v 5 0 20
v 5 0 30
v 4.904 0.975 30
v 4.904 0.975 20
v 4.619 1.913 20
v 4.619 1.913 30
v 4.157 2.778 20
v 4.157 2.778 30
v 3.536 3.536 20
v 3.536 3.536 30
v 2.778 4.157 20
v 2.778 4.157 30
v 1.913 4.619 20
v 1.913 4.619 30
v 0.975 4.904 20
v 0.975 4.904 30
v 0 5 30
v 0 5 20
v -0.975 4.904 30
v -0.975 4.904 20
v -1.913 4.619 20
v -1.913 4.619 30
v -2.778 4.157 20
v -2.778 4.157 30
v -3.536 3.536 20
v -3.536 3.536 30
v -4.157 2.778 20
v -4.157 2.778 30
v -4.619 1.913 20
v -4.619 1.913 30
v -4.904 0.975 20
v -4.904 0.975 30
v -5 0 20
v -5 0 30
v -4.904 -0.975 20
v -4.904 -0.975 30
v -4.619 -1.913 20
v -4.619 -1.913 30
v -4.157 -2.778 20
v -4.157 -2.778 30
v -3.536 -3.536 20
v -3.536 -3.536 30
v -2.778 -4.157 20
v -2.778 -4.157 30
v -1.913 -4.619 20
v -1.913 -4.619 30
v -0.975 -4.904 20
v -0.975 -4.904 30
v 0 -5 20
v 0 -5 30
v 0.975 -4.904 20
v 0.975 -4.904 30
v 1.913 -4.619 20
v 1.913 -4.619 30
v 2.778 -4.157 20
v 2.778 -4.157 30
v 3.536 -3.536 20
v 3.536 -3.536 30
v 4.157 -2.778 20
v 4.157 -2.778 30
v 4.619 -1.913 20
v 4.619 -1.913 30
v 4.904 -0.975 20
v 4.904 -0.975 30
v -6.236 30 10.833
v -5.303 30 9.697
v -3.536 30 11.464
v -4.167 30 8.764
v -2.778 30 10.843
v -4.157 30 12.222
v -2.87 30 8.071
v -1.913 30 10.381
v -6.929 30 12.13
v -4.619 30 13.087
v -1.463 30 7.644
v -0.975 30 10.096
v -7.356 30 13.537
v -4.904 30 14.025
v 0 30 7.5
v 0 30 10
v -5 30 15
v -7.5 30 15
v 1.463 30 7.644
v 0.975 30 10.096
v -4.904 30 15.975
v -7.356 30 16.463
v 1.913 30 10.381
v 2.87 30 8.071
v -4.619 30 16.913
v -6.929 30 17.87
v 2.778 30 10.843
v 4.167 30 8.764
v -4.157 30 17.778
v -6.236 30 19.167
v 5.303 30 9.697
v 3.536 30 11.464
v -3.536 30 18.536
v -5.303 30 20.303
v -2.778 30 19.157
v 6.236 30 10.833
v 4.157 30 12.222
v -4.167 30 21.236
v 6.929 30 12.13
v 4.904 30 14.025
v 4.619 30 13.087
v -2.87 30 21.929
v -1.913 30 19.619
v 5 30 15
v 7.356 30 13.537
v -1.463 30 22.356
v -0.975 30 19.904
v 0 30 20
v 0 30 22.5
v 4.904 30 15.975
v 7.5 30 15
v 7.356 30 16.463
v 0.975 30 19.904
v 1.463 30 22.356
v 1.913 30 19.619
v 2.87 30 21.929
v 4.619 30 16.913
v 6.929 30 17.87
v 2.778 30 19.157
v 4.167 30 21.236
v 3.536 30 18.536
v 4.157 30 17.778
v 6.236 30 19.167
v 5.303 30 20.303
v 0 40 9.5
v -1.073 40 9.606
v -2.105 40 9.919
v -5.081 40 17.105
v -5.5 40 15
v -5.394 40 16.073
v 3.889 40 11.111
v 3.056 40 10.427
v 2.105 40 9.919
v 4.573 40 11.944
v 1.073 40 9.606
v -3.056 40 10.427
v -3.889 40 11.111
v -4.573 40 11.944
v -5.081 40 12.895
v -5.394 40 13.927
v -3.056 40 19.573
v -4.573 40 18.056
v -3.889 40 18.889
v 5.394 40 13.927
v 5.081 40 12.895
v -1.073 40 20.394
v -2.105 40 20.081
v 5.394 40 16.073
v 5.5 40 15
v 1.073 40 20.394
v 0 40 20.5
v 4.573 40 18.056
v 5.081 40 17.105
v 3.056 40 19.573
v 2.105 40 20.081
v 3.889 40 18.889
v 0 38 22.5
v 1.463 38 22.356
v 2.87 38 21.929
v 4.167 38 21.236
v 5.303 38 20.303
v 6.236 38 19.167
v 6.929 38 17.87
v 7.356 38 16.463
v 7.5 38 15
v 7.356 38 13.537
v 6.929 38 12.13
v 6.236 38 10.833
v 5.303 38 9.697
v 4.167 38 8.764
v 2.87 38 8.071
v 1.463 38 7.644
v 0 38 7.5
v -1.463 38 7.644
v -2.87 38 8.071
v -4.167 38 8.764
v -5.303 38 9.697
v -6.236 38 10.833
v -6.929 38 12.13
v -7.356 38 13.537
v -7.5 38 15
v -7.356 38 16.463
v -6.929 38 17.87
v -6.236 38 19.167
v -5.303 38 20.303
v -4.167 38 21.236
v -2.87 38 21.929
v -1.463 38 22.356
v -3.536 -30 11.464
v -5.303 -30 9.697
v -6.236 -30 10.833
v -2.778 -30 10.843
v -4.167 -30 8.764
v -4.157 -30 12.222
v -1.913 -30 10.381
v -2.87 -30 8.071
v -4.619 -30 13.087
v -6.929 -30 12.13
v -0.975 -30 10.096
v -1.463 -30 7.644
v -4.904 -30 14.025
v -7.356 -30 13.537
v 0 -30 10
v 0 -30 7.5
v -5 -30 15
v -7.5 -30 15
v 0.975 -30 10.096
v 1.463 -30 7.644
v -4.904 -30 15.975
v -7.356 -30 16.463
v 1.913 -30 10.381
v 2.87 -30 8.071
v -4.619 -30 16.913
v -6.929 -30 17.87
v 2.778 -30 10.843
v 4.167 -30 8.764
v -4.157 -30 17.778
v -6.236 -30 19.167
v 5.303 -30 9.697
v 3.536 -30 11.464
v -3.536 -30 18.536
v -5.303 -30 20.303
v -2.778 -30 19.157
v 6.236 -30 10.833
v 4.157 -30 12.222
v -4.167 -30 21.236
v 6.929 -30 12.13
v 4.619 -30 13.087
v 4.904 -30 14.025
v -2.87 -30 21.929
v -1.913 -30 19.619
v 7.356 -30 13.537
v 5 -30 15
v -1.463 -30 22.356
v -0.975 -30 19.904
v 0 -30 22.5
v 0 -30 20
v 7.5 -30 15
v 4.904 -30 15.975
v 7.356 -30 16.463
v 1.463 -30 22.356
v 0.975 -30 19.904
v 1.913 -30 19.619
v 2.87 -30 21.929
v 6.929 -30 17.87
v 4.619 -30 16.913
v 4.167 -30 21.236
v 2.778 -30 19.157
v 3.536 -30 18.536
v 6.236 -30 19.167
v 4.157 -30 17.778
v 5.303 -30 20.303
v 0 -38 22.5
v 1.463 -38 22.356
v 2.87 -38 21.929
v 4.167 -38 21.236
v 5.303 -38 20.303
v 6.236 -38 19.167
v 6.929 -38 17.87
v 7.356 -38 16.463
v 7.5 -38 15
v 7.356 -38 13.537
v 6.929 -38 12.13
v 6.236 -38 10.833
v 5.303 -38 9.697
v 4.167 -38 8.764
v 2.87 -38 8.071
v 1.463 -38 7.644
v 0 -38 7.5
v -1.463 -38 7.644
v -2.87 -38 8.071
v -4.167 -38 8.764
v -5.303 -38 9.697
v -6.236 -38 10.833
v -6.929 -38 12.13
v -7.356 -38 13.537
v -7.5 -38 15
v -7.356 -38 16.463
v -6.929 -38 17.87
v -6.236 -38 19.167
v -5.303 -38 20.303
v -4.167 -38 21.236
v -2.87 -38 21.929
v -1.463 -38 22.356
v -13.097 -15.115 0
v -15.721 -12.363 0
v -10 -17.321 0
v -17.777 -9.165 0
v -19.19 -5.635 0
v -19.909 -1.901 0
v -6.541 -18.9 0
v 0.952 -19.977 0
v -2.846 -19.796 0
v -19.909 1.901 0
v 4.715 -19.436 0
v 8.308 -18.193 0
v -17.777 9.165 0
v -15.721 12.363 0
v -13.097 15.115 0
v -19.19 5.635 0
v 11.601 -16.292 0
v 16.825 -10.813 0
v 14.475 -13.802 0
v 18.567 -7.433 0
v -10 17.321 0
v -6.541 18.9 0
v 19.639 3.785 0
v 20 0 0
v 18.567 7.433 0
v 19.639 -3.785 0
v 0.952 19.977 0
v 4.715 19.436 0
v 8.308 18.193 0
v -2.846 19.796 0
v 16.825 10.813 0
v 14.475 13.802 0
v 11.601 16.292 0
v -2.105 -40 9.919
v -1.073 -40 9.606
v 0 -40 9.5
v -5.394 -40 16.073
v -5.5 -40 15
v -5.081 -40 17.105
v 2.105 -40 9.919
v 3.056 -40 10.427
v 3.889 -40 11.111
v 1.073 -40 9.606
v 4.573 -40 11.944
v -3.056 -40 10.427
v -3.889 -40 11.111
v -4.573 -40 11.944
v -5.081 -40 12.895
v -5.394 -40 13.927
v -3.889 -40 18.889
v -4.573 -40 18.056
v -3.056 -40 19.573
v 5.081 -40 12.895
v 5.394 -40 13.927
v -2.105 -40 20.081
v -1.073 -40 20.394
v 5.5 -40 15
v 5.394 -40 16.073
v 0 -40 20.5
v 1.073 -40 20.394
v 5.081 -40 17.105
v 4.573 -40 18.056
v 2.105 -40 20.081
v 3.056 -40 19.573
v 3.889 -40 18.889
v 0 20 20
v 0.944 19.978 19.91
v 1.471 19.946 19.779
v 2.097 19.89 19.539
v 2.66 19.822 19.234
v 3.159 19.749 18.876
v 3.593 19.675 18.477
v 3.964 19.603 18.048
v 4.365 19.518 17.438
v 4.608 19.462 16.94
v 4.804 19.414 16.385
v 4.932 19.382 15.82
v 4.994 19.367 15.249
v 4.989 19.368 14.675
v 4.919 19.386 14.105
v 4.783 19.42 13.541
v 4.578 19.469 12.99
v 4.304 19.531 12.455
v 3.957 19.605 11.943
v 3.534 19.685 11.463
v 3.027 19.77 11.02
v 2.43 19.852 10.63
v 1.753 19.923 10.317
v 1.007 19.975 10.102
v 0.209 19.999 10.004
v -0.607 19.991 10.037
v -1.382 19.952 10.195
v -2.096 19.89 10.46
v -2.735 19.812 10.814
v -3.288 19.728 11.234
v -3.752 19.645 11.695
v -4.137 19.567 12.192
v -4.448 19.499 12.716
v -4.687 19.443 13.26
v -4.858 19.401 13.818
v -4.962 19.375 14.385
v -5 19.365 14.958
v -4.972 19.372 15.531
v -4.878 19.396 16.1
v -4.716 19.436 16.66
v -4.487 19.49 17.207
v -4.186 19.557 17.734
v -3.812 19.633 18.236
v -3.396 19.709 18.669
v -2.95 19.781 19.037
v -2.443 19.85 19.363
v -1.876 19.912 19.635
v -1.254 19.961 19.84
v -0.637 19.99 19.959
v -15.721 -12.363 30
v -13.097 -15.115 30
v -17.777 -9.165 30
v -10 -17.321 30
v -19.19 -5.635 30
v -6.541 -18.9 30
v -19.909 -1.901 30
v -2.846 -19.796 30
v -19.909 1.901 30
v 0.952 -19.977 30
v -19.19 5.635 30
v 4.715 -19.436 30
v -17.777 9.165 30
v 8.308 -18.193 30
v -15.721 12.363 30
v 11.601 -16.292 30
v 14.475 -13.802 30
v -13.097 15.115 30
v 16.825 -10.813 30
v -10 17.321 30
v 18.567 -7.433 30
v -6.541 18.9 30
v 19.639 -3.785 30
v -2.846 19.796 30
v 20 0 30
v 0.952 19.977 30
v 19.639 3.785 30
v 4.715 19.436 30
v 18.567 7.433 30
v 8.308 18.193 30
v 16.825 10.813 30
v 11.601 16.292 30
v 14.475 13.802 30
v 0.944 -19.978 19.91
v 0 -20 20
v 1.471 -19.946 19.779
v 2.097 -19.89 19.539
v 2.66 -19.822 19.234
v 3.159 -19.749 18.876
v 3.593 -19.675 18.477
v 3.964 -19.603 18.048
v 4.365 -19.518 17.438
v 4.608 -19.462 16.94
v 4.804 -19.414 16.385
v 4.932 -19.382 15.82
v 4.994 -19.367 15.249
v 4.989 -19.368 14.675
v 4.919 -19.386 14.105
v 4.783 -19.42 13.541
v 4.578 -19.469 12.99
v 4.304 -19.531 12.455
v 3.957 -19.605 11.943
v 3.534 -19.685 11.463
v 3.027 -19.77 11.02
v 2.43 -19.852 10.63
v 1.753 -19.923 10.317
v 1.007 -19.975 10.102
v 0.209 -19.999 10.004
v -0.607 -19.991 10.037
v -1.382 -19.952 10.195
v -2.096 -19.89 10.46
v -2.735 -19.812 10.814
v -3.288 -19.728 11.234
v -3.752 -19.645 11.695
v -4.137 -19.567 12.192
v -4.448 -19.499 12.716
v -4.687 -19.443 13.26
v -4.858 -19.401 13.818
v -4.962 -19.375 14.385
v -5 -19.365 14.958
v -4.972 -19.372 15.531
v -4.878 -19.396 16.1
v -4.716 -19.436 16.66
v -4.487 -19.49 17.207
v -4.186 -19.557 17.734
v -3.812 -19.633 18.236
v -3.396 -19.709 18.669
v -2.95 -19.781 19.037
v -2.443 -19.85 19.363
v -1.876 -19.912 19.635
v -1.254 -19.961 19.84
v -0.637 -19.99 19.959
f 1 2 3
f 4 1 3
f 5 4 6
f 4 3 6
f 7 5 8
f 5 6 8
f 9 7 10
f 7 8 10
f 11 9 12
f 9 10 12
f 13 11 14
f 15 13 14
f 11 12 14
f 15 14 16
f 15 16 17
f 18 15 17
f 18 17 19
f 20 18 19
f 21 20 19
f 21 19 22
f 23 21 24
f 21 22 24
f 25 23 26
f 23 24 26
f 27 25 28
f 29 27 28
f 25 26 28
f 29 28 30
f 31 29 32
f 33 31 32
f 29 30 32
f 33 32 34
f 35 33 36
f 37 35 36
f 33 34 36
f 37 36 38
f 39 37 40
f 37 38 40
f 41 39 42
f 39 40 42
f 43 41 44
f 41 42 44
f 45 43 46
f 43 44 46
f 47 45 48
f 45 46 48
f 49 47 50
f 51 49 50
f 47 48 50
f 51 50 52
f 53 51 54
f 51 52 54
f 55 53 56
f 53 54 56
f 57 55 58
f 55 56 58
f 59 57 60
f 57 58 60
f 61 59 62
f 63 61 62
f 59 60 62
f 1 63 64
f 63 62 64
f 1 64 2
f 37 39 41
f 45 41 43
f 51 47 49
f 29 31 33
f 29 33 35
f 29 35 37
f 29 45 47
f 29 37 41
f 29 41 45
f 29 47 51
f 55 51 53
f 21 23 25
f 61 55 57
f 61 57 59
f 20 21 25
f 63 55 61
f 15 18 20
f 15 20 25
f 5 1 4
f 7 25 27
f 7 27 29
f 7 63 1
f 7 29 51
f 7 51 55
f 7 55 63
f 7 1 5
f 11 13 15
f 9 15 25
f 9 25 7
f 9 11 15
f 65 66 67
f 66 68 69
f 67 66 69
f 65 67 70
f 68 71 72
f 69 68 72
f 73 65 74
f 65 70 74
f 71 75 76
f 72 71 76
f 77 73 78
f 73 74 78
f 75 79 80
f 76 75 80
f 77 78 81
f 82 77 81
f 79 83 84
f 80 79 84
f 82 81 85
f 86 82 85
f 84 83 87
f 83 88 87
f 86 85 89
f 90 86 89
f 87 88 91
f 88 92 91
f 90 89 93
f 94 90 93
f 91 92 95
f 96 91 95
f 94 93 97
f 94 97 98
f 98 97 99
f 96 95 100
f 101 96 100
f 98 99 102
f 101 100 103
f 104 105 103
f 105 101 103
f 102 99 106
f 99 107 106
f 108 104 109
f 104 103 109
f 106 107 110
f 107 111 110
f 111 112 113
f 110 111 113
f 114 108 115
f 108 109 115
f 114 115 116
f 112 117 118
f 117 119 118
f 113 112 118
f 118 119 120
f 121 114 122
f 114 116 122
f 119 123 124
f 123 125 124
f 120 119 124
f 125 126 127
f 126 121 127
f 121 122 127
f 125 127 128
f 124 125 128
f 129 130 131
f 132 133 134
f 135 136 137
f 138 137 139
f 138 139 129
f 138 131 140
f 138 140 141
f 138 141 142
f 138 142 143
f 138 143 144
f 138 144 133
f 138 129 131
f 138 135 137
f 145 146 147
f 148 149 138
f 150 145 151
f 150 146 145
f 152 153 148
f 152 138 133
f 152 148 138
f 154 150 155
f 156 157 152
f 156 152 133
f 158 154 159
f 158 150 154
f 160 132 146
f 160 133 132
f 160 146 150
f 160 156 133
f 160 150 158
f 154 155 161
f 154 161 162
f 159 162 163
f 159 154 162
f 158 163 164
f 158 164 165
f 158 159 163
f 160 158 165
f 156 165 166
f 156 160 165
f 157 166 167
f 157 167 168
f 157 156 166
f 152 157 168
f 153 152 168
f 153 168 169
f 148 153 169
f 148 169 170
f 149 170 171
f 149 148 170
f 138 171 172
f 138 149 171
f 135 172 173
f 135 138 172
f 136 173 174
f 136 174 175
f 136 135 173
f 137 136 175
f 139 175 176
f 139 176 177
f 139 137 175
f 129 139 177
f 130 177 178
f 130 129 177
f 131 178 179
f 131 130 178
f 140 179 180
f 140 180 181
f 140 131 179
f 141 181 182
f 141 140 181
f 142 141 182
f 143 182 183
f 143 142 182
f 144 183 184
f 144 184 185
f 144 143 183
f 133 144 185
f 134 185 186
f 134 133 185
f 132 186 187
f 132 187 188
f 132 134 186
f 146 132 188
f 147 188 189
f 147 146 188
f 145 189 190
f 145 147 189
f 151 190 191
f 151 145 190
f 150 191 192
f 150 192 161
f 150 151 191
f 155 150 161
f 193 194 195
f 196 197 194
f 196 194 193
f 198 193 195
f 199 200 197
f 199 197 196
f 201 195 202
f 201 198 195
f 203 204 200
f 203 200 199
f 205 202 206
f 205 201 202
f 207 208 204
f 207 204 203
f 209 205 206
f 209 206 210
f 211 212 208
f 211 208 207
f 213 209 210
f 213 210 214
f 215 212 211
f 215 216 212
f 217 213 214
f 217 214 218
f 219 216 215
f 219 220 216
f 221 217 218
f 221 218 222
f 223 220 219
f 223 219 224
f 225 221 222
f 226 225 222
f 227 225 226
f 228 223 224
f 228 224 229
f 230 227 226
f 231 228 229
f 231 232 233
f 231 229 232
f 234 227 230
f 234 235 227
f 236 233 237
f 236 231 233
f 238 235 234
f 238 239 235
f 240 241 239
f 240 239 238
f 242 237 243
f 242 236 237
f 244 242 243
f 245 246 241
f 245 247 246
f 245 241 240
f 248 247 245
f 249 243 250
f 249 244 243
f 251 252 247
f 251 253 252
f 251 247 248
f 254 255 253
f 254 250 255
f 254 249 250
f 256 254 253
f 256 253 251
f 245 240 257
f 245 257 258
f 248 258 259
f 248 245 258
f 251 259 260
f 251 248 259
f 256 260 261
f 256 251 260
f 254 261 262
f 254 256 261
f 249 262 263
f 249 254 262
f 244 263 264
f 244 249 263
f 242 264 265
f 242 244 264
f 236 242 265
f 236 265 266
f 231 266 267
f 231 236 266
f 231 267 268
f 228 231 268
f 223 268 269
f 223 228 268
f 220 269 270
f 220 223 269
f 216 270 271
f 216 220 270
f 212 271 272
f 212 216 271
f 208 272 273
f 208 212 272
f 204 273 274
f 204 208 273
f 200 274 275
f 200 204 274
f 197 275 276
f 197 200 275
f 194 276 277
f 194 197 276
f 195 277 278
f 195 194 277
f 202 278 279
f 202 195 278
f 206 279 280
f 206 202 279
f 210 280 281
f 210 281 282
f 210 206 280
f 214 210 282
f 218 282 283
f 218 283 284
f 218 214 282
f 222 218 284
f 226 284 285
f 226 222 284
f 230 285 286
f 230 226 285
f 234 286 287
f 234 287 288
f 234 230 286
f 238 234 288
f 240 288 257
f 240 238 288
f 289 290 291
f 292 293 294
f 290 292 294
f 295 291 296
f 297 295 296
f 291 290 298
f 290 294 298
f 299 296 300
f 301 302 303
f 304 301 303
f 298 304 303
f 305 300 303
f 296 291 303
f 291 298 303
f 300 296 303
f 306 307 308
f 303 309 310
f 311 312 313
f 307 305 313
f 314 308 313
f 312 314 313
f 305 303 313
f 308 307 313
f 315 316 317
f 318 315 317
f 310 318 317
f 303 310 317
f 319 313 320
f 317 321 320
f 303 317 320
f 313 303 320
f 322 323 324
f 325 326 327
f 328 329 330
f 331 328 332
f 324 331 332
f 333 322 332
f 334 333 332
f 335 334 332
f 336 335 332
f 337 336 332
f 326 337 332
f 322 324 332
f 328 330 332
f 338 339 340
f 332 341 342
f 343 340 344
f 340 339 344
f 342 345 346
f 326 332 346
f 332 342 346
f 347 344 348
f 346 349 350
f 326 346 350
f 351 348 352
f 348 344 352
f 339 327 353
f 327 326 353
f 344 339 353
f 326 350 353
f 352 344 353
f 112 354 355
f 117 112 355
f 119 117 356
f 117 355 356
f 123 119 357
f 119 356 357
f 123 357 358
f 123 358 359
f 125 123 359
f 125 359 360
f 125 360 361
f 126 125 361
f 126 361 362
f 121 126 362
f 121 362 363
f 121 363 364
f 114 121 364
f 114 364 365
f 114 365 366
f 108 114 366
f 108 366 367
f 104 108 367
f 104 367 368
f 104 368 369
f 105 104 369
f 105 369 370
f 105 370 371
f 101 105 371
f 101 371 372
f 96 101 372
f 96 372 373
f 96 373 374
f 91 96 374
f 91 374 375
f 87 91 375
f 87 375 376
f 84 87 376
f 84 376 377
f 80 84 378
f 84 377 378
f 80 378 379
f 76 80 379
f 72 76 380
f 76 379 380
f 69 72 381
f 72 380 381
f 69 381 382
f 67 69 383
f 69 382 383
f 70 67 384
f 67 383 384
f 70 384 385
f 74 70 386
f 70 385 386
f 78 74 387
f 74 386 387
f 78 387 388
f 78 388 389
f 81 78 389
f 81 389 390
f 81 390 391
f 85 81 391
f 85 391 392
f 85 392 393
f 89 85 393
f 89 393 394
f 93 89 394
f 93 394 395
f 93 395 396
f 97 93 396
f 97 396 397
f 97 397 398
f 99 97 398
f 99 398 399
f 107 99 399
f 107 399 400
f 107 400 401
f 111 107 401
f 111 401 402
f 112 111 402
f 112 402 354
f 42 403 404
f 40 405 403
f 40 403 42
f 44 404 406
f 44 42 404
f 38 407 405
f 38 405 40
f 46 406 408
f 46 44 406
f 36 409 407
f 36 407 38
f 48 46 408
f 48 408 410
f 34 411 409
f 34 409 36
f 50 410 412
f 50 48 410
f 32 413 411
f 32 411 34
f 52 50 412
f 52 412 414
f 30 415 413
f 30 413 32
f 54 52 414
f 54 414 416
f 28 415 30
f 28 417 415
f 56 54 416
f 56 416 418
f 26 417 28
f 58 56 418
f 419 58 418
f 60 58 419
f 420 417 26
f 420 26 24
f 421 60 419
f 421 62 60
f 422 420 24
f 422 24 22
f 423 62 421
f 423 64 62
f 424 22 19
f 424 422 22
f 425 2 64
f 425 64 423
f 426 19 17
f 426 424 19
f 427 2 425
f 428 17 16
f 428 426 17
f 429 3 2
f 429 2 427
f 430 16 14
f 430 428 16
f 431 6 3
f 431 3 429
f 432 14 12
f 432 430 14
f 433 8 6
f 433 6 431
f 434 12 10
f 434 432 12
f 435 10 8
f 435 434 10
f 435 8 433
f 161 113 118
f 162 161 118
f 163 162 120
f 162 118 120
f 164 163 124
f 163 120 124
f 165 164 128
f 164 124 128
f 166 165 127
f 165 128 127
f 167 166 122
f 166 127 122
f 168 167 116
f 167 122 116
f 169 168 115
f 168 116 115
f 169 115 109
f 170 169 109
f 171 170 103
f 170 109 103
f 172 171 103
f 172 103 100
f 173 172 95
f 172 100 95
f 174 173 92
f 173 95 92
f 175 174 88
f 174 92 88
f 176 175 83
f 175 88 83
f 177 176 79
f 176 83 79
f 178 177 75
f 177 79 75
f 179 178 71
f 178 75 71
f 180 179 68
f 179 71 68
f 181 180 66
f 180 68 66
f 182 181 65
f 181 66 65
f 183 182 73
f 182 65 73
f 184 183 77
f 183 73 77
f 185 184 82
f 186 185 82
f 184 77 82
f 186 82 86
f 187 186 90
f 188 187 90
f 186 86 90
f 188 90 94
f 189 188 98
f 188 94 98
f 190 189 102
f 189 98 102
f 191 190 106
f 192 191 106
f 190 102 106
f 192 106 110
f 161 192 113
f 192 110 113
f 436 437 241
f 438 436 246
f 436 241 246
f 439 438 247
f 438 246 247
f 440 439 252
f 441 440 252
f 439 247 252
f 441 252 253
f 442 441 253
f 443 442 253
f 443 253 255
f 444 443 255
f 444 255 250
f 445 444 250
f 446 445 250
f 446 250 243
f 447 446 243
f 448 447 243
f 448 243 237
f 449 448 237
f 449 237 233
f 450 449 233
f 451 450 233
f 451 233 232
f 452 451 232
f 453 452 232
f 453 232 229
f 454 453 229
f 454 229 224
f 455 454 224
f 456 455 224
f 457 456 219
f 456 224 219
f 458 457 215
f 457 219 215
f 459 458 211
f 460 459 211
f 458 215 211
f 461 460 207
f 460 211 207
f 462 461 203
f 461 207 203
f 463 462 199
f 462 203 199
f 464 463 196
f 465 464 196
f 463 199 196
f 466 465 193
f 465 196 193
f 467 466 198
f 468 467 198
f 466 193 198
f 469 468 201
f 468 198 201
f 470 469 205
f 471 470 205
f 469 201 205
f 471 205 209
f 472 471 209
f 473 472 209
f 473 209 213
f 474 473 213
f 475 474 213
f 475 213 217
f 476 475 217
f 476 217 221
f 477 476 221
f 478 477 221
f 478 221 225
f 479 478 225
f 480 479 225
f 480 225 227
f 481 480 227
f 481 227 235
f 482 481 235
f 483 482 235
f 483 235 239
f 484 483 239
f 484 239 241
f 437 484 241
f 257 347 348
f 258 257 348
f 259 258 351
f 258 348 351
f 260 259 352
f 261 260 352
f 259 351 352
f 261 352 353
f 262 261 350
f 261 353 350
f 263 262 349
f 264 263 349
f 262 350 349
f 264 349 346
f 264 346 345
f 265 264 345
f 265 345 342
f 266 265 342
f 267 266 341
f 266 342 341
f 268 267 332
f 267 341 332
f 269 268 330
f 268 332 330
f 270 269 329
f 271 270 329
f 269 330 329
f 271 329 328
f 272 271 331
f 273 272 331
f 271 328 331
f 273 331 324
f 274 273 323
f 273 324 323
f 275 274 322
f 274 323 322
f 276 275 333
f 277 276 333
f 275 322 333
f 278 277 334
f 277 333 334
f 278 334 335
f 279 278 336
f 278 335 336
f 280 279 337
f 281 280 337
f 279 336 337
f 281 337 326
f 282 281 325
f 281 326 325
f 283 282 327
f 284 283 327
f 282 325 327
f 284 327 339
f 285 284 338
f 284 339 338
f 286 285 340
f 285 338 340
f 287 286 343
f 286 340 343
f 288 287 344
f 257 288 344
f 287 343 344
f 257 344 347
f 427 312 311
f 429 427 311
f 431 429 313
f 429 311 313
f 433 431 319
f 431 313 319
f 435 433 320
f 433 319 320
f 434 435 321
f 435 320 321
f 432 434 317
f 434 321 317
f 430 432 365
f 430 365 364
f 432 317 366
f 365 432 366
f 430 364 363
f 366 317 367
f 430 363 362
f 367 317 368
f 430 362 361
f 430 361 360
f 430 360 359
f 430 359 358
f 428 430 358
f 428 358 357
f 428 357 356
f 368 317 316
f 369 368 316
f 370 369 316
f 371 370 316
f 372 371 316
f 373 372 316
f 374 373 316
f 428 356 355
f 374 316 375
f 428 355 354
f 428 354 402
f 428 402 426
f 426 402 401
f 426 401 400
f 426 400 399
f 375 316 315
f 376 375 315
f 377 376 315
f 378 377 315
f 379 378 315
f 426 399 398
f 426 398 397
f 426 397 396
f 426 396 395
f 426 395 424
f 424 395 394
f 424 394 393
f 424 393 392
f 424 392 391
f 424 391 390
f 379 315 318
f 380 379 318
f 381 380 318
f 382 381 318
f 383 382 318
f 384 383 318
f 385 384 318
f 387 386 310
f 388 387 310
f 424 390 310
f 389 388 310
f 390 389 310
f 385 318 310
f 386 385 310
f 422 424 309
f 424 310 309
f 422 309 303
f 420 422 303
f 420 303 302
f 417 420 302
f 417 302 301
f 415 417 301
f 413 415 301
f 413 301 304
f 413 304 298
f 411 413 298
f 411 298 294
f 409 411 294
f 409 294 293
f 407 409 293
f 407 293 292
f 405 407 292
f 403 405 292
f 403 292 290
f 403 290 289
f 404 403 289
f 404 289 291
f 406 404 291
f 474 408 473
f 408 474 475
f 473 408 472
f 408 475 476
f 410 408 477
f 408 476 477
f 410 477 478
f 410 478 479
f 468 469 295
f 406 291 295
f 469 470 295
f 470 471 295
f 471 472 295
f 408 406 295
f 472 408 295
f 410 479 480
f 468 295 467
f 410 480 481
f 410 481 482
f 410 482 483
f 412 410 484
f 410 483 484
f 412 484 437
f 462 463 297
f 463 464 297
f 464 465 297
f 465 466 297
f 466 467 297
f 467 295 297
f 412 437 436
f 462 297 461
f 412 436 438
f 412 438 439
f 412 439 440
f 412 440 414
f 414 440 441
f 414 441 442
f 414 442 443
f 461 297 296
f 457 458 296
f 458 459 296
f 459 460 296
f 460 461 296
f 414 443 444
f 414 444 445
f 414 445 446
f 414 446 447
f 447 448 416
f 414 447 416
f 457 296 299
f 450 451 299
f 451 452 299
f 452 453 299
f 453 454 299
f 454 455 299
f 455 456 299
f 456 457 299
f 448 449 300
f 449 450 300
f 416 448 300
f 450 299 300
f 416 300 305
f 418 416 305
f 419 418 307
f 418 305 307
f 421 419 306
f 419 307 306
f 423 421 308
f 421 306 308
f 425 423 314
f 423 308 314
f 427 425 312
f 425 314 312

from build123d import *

# Parameters (mm, degrees)
SKETCH1_R                = 20
BOSS_EXTRUDE1_DEPTH      = 30
BOSS_EXTRUDE2_DEPTH      = 30
BOSS_EXTRUDE2_DEPTH_BACK = 30
SKETCH2_R                = 5
SKETCH3_R                = 7.5
BOSS_EXTRUDE3_DEPTH      = 10
CHAMFER1_SIZE            = 2
CHAMFER1_OF_MIRROR1_SIZE = 2
SKETCH4_R                = 5
CUT_EXTRUDE1_DEPTH       = 10


with BuildPart() as part:
    # Sketch1 → Boss-Extrude1 (new body)
    with BuildSketch(Plane.XY):
        Circle(SKETCH1_R)
    extrude(amount=BOSS_EXTRUDE1_DEPTH)

    # Sketch2 → Boss-Extrude2 (add, two sides: drawn at the far end of the back side and taken through both)
    with BuildSketch(Plane(origin=(0, 0, 0), x_dir=(1, 0, 0), z_dir=(0, 1, 0)).offset(-BOSS_EXTRUDE2_DEPTH_BACK)):
        with Locations((0, -15)):
            Circle(SKETCH2_R)
    extrude(amount=BOSS_EXTRUDE2_DEPTH + BOSS_EXTRUDE2_DEPTH_BACK)

    # Sketch3 → Boss-Extrude3 (add)
    with BuildSketch(Plane(origin=(0, 30, 0), x_dir=(1, 0, 0), z_dir=(0, 1, 0))):
        with Locations((0, -15)):
            Circle(SKETCH3_R)
    boss_extrude3 = extrude(amount=BOSS_EXTRUDE3_DEPTH)

    # Chamfer1
    chamfer1_edges = [part.edges().sort_by_distance(p)[0] for p in [
        (-7.5, 40, 15),
    ]]
    chamfer(chamfer1_edges, length=CHAMFER1_SIZE)

    # Mirror1: Boss-Extrude3 across plane
    add(boss_extrude3.mirror(Plane.ZX))

    # Chamfer1 of Mirror1
    chamfer1_of_mirror1_edges = [part.edges().sort_by_distance(p)[0] for p in [
        (-7.5, -40, 15),
    ]]
    chamfer(chamfer1_of_mirror1_edges, length=CHAMFER1_OF_MIRROR1_SIZE)

    # Sketch4 → Cut-Extrude1 (cut)
    with BuildSketch(Plane.XY.offset(30)):
        Circle(SKETCH4_R)
    extrude(amount=-CUT_EXTRUDE1_DEPTH, mode=Mode.SUBTRACT)


solid = part.part
